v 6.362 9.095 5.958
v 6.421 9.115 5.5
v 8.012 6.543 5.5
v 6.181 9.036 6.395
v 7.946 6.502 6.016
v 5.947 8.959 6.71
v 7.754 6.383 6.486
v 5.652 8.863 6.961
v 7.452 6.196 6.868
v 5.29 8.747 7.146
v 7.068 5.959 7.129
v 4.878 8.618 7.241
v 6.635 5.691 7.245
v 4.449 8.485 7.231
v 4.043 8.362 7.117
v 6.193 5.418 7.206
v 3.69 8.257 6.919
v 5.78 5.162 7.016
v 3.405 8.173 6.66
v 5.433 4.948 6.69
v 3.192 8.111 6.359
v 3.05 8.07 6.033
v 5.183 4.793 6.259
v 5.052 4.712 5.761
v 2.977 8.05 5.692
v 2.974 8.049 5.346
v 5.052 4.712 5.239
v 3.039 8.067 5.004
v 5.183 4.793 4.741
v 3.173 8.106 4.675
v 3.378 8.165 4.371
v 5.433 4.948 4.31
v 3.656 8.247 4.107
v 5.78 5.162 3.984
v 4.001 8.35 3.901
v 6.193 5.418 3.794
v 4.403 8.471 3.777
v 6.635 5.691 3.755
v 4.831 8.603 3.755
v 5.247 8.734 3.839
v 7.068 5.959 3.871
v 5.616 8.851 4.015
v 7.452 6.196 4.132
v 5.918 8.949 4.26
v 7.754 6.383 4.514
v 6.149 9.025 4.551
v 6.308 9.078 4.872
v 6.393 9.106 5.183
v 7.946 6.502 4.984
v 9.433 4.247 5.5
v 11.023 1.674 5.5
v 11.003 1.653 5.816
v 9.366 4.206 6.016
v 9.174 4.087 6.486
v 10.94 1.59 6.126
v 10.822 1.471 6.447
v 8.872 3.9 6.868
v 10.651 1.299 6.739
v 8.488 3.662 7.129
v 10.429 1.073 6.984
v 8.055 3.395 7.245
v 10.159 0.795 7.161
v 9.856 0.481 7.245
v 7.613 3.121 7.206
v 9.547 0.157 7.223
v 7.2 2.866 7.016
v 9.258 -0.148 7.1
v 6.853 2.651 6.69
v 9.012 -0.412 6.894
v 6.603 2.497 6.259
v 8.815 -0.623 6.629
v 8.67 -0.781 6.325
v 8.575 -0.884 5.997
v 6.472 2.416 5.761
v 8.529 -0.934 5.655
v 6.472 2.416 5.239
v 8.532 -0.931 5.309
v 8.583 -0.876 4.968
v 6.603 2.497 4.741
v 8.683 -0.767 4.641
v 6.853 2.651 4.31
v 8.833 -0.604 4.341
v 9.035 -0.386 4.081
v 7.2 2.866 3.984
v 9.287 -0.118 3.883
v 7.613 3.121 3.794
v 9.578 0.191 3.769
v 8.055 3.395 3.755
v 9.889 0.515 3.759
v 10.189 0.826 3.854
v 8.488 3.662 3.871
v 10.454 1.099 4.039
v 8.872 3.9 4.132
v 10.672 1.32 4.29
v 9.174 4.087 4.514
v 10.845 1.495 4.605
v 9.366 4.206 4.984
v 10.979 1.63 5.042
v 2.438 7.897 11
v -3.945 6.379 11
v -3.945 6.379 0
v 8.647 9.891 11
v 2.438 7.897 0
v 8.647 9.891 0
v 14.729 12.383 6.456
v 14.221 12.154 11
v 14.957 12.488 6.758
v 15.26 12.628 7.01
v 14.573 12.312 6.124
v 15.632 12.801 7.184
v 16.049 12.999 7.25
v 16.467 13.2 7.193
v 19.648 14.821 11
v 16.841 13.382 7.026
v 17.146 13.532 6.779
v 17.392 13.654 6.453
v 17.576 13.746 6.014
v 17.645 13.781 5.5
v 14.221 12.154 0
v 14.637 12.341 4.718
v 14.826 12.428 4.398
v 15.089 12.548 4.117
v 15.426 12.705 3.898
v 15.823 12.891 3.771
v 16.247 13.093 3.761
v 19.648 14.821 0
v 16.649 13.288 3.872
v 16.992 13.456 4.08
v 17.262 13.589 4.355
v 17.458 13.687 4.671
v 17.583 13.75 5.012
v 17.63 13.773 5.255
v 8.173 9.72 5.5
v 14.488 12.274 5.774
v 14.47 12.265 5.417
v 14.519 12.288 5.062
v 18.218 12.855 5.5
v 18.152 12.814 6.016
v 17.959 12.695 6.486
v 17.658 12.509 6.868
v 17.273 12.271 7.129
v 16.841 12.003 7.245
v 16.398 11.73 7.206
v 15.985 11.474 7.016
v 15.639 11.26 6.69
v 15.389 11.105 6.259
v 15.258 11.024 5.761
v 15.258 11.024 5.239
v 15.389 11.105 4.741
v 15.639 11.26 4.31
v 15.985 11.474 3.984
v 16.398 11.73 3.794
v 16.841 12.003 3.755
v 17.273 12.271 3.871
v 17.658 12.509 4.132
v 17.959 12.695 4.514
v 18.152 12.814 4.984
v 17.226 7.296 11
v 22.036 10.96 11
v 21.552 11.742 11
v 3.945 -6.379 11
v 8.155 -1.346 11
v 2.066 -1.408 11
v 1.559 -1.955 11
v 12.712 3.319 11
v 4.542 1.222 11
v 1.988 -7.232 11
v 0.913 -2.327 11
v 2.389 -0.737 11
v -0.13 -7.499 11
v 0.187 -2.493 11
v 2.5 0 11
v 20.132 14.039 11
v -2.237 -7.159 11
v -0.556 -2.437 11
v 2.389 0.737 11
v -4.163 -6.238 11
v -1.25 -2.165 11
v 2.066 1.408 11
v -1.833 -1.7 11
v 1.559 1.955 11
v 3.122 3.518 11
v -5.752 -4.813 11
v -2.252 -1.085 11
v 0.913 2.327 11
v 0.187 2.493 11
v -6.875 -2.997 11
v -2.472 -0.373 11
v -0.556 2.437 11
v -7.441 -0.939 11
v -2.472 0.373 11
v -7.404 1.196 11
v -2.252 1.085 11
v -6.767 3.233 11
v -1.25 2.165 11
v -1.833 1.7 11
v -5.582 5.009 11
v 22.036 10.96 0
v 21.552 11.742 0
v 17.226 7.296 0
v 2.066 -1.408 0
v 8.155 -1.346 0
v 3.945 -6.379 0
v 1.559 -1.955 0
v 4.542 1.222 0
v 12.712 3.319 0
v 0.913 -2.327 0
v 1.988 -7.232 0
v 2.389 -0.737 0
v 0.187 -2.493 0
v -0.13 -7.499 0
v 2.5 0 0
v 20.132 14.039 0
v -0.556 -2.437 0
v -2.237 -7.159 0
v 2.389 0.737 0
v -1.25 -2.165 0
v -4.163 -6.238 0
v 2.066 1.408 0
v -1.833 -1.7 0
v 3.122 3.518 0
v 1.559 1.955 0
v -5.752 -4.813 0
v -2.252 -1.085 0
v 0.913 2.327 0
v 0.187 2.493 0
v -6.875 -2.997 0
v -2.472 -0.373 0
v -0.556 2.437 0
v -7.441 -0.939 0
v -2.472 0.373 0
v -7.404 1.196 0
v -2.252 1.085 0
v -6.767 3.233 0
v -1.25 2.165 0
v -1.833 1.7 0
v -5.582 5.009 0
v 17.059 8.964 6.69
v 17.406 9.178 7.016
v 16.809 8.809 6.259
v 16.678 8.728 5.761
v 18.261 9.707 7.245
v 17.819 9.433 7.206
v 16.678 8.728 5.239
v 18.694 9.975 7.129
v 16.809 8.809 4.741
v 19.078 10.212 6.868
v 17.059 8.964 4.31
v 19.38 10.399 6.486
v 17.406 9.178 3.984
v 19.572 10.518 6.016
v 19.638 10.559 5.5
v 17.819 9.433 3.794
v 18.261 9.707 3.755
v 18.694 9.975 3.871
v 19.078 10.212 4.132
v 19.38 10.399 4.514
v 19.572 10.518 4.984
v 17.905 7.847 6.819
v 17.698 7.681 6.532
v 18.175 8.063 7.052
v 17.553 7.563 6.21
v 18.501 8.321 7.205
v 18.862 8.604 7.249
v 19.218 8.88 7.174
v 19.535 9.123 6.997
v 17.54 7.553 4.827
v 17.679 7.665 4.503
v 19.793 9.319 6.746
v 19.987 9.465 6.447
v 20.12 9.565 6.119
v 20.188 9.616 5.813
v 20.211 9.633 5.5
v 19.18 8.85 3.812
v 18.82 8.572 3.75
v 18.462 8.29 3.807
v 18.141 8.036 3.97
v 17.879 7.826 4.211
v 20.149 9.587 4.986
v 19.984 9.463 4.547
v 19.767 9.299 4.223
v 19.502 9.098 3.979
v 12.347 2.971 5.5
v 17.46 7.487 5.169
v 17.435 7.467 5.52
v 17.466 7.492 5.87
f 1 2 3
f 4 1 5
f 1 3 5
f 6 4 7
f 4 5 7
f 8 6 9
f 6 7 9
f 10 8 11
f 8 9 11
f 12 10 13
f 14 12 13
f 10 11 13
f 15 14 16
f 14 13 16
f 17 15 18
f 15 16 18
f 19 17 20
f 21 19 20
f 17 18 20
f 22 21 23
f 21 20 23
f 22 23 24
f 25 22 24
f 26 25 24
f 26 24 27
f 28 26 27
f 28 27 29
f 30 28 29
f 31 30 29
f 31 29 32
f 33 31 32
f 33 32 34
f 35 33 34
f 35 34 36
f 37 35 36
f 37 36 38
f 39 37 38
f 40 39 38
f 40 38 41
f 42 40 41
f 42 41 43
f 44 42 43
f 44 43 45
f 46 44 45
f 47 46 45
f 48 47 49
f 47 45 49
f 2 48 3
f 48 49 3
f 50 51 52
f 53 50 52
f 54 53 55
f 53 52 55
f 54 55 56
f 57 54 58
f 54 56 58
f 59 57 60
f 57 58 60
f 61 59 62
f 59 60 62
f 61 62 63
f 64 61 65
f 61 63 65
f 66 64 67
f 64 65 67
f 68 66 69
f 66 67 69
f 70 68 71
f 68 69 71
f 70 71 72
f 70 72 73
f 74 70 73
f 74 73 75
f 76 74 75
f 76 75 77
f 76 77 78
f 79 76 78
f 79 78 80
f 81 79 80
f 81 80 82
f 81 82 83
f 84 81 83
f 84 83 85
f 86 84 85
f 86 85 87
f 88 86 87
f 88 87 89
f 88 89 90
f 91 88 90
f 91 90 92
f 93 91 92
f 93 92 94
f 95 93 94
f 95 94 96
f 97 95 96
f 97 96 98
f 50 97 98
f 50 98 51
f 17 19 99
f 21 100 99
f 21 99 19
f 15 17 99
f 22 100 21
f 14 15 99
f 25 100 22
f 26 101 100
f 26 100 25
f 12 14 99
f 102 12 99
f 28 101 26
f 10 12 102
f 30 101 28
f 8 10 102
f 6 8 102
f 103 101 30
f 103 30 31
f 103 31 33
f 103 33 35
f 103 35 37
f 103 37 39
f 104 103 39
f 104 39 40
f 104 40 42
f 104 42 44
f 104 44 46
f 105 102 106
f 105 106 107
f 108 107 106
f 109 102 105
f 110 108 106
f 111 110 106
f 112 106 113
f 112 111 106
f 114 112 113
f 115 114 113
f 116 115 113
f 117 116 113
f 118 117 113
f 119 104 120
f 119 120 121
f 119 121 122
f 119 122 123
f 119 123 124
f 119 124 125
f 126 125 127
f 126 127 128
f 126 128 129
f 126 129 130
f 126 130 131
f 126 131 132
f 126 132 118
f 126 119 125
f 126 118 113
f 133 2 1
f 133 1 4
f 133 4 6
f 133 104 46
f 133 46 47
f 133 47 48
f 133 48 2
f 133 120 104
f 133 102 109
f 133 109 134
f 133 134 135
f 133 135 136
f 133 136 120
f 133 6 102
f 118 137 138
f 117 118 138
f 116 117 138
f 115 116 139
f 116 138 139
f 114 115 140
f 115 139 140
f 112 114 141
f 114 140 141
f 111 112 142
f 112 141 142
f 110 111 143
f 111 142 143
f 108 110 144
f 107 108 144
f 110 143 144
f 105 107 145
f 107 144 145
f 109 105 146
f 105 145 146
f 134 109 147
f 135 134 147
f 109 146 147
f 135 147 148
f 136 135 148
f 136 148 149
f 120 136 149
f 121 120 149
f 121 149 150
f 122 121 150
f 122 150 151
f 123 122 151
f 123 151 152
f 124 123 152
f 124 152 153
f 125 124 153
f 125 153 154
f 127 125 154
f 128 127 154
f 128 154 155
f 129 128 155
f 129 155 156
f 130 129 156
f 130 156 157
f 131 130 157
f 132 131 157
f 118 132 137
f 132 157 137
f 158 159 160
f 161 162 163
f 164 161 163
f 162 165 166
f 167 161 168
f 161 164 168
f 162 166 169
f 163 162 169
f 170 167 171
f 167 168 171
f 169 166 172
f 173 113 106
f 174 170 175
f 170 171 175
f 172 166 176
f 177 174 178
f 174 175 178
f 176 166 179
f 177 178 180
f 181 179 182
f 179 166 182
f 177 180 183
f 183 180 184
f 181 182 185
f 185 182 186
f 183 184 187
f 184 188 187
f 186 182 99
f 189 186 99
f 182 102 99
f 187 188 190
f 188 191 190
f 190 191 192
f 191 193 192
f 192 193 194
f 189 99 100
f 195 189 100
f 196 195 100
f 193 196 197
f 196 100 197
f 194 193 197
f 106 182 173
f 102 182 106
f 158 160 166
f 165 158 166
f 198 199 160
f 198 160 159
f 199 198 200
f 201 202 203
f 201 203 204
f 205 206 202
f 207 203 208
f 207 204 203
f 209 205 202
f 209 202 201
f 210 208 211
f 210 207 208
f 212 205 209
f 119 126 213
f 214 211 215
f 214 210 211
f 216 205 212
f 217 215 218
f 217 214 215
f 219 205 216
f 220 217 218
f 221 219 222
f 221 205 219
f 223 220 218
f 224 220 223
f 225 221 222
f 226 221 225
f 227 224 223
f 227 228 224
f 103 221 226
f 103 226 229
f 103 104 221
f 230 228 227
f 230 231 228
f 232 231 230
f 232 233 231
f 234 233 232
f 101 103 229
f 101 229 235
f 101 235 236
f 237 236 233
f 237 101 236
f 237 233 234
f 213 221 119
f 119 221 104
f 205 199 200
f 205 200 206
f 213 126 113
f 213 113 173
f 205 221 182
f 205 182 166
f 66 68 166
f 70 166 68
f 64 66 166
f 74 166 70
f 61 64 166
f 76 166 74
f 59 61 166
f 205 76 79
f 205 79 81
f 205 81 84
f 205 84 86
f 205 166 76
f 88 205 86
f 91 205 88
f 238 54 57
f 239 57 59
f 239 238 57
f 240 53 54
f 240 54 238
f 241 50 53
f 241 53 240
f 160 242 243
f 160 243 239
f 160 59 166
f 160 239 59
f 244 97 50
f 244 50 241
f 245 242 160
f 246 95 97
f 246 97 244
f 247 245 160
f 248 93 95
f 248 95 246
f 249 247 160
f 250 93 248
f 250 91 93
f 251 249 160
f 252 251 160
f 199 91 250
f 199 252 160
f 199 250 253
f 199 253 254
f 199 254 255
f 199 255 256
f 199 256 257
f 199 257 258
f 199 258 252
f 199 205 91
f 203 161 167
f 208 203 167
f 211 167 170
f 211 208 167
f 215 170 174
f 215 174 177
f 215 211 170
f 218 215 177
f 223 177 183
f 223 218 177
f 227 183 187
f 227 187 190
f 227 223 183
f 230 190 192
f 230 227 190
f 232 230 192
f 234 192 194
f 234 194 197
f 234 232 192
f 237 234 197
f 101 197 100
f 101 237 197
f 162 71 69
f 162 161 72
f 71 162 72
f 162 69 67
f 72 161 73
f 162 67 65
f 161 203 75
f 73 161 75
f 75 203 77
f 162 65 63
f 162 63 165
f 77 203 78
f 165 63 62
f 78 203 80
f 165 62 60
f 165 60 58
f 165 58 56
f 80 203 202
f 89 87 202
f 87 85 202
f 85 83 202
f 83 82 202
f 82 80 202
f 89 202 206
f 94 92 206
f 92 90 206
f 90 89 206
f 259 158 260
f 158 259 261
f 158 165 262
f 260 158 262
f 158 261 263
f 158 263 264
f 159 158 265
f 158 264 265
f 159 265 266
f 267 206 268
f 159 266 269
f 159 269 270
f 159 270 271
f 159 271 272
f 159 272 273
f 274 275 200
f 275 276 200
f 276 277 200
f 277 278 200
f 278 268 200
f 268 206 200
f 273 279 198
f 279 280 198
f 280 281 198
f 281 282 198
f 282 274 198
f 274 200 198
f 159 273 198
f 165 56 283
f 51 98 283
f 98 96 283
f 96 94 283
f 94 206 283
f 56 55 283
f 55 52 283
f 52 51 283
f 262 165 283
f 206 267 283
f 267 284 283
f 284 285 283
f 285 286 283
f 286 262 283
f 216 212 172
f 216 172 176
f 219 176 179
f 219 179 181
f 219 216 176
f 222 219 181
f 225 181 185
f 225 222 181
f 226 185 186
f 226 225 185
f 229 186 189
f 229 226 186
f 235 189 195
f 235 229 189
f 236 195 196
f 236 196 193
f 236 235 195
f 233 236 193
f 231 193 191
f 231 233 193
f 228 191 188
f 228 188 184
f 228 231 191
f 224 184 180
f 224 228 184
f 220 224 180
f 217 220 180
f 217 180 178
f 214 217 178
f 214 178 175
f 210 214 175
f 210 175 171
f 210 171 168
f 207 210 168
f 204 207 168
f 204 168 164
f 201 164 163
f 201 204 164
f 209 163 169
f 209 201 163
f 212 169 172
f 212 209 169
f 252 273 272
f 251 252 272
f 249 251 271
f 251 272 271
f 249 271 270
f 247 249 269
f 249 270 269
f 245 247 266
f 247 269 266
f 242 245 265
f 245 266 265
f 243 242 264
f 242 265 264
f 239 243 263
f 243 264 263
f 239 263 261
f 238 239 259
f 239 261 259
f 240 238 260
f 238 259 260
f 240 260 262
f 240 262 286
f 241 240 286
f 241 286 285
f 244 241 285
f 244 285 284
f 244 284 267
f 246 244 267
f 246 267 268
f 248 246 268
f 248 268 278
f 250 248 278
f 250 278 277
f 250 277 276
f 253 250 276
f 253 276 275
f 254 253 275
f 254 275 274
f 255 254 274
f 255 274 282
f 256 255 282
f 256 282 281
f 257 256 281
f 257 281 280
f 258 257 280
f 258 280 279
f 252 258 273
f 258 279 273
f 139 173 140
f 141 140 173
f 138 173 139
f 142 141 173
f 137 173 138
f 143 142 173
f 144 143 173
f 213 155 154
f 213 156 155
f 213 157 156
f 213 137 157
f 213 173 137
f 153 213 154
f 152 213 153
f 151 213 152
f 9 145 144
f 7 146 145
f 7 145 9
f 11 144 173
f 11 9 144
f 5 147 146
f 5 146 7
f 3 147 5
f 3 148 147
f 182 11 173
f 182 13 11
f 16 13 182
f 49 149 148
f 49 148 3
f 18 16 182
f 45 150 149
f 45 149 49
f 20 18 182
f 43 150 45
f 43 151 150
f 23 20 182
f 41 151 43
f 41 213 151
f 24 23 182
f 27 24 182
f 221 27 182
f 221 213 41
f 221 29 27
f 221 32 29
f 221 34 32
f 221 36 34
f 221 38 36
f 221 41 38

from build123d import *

# Parameters (mm, degrees)
SKETCH2_R           = 2.5
BOSS_EXTRUDE1_DEPTH = 11
SKETCH3_R           = 1.75
CUT_EXTRUDE1_DEPTH  = 30.961226777


with BuildPart() as part:
    # Sketch2 → Boss-Extrude1 (new body)
    with BuildSketch(Plane.XY):
        with BuildLine():
            Line((19.64777021, 14.82081493), (20.13151796, 14.038683694))
            Line((20.13151796, 14.038683694), (3.122043563, 3.518332904))
            Line((3.122043563, 3.518332904), (4.542290919, 1.222053861))
            Line((4.542290919, 1.222053861), (21.551765317, 11.74240465))
            Line((21.551765317, 11.74240465), (22.035513067, 10.960273414))
            add(Edge.make_bspline(
                [(3.945113039, -6.378564346), (11.703739539, 3.65165423), (22.035513067, 10.960273414)],
                knots=[0, 0, 0, 1, 1, 1], degree=2))
            ThreePointArc((3.945113039, -6.378564346), (-6.378571406, -3.945142993), (-3.945150053, 6.378541452))
            add(Edge.make_bspline(
                [(-3.945150053, 6.378541452), (8.494257916, 8.84079636), (19.64777021, 14.82081493)],
                knots=[0, 0, 0, 1, 1, 1], degree=2))
        make_face()
        with Locations((-1.8507e-05, -1.1447e-05)):
            Circle(SKETCH2_R, mode=Mode.SUBTRACT)
    extrude(amount=BOSS_EXTRUDE1_DEPTH)

    # Sketch3 → Cut-Extrude1 (cut, through all)
    with BuildSketch(Plane(origin=(3.945131546, -6.378552899, 0), x_dir=(0, 0, -1), z_dir=(0.5260175394579771, -0.8504737198659202, 0))):
        with Locations(Location((-5.5, 20.50592082, 0), (0, 0, 90))):
            Circle(SKETCH3_R)
        with Locations(Location((-5.5, 8.50592082, 0), (0, 0, 90))):
            Circle(SKETCH3_R)
    extrude(amount=-CUT_EXTRUDE1_DEPTH, mode=Mode.SUBTRACT)


solid = part.part
